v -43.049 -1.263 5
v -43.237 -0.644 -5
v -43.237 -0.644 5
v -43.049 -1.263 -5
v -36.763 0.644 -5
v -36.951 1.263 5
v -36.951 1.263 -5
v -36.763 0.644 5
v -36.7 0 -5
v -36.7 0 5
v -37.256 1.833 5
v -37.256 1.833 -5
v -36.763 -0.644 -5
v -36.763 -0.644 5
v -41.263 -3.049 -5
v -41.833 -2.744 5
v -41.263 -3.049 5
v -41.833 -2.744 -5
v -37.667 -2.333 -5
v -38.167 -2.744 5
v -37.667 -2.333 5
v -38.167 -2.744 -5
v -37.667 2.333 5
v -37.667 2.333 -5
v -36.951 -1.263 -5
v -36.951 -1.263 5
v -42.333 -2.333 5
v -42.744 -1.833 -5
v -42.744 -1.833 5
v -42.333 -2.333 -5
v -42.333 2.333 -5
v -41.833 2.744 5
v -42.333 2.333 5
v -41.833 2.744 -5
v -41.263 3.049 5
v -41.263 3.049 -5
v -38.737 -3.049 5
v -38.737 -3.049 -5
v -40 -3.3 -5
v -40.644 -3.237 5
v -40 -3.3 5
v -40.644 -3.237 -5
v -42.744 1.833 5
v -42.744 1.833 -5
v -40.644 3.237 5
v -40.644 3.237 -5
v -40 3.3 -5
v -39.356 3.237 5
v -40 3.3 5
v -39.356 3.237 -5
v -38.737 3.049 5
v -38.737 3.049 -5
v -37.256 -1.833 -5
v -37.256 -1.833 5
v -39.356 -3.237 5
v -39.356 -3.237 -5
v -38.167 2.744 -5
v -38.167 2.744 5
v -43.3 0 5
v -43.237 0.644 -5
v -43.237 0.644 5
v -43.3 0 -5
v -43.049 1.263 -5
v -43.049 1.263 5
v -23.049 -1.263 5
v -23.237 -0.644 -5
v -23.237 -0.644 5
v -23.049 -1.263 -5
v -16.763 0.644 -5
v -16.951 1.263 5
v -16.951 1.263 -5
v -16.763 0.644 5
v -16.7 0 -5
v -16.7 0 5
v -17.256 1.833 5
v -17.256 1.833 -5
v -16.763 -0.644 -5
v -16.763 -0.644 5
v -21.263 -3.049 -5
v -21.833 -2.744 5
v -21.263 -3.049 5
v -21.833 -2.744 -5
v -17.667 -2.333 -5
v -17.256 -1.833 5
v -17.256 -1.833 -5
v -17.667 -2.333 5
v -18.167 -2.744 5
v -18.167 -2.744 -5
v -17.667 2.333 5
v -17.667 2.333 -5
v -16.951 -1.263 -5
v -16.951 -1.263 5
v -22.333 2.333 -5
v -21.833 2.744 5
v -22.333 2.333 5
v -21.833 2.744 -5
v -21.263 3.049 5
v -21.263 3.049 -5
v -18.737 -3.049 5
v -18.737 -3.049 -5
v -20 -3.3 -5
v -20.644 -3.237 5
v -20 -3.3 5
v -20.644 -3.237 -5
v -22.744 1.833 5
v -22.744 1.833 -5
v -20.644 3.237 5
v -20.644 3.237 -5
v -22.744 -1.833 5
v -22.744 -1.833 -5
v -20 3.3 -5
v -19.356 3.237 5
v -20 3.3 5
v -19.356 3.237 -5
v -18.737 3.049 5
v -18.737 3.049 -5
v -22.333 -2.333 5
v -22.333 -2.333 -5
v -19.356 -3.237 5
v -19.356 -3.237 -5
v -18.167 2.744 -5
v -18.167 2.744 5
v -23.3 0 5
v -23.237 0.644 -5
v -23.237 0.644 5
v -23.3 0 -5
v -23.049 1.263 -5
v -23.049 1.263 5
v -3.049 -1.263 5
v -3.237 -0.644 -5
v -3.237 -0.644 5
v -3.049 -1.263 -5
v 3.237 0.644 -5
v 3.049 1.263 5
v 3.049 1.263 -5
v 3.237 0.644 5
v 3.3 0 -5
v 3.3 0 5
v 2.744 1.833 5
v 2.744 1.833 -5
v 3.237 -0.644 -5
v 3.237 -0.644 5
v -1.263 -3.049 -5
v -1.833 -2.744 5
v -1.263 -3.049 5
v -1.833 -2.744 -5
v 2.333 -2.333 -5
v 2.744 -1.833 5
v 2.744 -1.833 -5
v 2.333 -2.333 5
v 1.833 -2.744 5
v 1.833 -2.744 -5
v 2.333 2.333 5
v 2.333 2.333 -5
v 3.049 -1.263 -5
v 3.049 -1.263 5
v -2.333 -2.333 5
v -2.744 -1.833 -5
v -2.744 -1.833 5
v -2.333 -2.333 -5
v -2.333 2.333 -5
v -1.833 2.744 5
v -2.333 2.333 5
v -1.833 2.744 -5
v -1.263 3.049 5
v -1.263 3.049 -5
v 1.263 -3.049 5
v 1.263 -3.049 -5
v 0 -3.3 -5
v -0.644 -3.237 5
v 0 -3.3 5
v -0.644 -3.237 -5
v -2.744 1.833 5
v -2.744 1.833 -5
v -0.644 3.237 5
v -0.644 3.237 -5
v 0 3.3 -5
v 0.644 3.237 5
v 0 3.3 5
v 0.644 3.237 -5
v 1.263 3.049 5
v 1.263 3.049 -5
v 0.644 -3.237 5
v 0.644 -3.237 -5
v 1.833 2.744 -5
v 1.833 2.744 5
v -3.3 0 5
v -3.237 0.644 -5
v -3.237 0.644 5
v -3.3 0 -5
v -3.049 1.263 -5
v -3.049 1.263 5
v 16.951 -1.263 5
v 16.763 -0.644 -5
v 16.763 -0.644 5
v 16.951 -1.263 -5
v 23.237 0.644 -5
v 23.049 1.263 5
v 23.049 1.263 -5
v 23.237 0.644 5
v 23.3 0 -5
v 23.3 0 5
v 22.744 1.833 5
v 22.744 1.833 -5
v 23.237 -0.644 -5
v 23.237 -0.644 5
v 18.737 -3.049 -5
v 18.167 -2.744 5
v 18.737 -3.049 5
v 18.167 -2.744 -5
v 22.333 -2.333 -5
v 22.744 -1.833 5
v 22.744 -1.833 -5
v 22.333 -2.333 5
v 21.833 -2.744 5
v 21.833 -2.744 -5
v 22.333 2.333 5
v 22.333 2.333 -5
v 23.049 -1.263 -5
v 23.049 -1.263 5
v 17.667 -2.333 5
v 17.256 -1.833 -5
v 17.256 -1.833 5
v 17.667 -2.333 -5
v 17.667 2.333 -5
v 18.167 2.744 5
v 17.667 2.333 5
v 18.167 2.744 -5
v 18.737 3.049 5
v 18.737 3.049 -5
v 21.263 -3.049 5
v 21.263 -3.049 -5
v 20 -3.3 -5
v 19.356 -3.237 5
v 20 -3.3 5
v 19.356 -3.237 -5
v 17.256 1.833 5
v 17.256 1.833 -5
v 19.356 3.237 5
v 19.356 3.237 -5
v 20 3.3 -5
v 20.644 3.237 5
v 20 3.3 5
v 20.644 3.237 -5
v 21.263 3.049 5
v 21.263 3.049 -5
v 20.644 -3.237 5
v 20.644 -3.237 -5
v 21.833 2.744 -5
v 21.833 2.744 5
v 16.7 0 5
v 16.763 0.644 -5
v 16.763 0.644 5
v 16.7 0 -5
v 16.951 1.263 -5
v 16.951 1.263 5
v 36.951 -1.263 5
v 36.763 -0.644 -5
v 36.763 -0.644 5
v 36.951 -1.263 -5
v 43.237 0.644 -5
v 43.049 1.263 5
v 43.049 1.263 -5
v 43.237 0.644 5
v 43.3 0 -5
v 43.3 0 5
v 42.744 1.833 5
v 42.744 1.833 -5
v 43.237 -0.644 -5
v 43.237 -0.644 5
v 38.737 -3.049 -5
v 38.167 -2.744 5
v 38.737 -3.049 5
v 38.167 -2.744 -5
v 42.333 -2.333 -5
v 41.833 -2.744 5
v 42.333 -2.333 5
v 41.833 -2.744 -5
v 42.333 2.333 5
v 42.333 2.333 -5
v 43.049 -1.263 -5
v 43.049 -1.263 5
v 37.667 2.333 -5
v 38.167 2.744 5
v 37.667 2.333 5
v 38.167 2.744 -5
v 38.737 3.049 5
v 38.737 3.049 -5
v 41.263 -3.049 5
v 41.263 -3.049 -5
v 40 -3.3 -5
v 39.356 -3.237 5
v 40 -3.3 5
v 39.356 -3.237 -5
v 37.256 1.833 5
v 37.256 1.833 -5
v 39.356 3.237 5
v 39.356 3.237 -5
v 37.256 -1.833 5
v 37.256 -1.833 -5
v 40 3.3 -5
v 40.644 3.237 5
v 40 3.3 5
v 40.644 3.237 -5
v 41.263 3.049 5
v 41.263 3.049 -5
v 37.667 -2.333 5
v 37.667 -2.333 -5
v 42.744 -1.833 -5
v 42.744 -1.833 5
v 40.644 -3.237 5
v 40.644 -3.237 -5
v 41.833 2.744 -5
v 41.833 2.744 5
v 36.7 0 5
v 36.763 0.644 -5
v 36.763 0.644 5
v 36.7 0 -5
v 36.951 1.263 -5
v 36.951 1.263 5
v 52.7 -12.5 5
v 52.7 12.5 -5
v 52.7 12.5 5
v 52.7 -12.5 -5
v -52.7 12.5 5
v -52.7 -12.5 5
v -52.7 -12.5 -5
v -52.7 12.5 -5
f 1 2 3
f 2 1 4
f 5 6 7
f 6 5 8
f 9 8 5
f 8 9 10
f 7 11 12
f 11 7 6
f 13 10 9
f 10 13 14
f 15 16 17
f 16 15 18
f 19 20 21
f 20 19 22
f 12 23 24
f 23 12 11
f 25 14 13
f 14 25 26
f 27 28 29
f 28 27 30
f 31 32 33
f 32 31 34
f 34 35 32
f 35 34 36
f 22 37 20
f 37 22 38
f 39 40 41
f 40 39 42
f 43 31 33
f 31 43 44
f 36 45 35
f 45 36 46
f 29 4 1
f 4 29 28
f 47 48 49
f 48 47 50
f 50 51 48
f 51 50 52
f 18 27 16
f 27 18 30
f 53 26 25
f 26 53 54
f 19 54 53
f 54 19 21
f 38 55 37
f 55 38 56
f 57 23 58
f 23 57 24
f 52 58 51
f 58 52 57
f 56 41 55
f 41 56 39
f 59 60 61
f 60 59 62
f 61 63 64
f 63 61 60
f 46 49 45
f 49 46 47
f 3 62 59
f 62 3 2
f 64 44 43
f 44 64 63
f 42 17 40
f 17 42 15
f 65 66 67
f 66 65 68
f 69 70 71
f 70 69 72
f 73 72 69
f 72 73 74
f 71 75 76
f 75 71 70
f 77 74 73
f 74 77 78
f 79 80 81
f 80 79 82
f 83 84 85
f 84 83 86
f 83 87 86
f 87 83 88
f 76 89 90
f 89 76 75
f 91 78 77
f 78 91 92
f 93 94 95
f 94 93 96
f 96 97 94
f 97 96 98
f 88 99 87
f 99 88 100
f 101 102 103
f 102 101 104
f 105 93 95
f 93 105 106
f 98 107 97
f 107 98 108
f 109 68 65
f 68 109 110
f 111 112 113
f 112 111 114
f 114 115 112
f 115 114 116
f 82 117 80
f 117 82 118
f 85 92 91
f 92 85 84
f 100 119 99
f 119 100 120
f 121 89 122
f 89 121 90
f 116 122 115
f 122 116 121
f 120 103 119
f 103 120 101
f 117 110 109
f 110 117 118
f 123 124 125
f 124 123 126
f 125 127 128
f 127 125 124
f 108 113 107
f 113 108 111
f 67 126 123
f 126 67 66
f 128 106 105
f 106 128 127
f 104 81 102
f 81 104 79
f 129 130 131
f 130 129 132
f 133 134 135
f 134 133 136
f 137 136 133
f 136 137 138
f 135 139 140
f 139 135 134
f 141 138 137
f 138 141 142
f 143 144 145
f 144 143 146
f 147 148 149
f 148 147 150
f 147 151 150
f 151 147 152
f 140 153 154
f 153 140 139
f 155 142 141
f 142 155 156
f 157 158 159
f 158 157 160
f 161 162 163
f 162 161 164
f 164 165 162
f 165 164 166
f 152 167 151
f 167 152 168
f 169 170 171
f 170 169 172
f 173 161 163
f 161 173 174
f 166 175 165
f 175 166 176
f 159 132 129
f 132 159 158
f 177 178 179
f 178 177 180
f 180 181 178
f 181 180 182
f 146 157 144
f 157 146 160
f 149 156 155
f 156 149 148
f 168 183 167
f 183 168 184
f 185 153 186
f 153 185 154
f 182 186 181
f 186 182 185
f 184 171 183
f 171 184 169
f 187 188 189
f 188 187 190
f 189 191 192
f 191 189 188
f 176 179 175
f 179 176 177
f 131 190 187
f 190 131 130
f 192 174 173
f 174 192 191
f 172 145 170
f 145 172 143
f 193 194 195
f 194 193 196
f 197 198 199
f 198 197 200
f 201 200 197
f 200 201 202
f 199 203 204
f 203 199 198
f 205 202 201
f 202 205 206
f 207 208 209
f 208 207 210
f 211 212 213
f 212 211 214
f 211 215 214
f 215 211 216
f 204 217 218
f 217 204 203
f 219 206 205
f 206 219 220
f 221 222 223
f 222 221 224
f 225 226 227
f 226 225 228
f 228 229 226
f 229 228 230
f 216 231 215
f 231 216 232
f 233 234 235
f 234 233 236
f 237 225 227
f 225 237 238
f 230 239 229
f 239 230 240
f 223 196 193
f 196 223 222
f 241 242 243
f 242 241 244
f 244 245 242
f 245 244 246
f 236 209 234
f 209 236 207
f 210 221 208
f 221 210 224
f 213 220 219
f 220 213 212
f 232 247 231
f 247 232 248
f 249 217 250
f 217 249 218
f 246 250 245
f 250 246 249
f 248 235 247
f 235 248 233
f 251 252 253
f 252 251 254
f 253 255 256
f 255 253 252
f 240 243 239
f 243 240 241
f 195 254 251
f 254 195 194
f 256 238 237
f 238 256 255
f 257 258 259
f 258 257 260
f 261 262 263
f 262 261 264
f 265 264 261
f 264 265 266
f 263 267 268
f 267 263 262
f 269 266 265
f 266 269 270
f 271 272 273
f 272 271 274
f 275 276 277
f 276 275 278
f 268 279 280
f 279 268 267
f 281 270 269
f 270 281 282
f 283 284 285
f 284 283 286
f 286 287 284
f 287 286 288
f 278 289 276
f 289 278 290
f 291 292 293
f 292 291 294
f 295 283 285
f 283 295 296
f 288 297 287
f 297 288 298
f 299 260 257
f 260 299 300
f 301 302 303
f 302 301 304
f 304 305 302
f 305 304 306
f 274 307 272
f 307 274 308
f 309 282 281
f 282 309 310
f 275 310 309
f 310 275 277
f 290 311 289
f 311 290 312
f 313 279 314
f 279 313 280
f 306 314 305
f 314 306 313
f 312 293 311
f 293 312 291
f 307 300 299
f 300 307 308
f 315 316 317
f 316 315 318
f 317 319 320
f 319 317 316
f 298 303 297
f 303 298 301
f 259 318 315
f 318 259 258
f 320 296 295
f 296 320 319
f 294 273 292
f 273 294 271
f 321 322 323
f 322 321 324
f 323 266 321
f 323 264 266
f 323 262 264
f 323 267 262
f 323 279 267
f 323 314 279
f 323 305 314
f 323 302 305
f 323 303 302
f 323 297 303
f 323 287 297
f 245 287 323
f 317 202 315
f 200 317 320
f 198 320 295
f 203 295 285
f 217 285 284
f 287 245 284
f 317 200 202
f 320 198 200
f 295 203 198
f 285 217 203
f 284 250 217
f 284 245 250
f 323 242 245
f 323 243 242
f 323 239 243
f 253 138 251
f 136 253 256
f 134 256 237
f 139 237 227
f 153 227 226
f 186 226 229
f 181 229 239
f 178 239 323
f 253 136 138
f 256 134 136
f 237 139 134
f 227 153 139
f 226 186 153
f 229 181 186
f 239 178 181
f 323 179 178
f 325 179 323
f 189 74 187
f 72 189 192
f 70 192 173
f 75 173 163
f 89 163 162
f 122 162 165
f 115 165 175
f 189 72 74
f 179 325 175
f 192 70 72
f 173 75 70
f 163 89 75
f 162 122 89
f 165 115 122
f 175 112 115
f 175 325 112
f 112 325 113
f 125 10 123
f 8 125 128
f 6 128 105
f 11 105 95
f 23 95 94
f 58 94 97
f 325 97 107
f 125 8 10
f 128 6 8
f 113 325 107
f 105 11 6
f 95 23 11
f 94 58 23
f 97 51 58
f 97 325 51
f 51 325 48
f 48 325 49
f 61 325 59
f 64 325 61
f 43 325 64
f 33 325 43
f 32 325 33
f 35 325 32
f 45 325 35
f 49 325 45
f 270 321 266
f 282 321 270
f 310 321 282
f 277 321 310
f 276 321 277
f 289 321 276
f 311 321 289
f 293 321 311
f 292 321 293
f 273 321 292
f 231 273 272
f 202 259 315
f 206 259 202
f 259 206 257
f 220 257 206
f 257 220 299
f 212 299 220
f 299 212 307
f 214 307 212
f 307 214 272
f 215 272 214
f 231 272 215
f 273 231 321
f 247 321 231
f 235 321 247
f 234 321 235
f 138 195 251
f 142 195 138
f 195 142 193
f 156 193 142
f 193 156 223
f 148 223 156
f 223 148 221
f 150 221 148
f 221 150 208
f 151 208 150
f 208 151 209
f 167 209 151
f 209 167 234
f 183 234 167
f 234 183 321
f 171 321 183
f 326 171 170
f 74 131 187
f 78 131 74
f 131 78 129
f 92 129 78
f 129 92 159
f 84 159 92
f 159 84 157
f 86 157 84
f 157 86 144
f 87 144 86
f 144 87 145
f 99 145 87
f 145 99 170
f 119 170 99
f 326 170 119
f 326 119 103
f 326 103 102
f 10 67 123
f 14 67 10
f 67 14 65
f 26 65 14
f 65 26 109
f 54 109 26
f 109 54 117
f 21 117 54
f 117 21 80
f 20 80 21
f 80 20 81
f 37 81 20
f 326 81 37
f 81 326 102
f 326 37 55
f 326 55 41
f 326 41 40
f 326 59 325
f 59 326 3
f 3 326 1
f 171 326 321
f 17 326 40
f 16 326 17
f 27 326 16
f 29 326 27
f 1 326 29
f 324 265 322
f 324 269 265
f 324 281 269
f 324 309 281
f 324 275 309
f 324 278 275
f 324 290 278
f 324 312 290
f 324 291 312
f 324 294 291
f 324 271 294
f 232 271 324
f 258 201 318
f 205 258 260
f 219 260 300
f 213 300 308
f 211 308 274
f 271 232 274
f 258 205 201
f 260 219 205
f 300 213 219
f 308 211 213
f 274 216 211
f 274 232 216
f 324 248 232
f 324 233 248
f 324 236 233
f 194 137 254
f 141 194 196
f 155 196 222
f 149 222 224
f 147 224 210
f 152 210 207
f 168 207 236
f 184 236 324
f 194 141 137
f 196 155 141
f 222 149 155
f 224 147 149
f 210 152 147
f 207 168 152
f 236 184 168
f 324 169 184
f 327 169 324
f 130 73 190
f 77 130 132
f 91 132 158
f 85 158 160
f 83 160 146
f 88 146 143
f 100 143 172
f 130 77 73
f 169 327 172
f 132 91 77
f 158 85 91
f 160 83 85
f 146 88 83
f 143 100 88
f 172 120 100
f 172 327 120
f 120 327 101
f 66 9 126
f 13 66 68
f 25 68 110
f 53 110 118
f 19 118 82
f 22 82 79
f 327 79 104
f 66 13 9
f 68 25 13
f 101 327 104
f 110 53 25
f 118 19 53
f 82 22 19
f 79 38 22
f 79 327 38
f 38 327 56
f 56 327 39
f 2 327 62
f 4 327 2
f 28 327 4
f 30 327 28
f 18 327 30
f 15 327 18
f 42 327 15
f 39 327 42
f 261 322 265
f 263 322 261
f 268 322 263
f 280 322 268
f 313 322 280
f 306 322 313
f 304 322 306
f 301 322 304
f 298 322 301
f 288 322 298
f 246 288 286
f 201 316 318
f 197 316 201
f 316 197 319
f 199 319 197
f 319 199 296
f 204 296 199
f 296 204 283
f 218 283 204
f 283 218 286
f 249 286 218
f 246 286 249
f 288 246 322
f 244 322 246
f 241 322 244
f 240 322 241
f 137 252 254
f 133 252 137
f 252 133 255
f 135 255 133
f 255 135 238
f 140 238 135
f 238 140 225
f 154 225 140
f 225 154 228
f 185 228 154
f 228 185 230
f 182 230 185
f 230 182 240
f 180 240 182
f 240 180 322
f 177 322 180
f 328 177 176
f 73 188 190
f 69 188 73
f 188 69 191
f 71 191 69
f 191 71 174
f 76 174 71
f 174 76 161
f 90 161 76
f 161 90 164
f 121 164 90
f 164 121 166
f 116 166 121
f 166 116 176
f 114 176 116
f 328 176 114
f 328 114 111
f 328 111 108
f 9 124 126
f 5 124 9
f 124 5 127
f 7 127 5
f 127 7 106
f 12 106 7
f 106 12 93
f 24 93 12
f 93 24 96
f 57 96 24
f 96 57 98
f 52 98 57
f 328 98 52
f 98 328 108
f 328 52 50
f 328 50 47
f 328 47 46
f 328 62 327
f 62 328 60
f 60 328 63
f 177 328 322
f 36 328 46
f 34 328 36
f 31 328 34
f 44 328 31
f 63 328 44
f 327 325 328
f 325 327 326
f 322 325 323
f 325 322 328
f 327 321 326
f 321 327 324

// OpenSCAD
$fn = 32;

// ----------------------------------------------------------------------
// Hole bar, 5 x Ø6.6
// row layout, 12.7 mm edge offset
// ----------------------------------------------------------------------

// --- parameters (mm) ---
bar_w = 25;    // bar width (Y)
bar_t = 10;    // bar thickness (Z)
holes = 5;     // holes per row
hole_d = 6.6;  // hole diameter
edge = 12.7;   // offset from the bar end to the first hole
pitch = 20;    // pitch between neighbouring holes

// --- derived feature positions (mm) ---
span = (holes - 1) * pitch;   // = 80   distance between the end holes
bar_l = span + 2 * edge;      // = 105.4   overall bar length
start_x = -bar_l / 2 + edge;  // = -40   X of the first hole
feature_centers = [
  [start_x + 0 * pitch, 0],
  [start_x + 1 * pitch, 0],
  [start_x + 2 * pitch, 0],
  [start_x + 3 * pitch, 0],
  [start_x + 4 * pitch, 0]
];   // hole centres of the first row

// bar with one row of holes, drilled from feature_centers
difference() {
  translate([-bar_l / 2, -bar_w / 2, -bar_t / 2]) cube([bar_l, bar_w, bar_t]);
  for (centre = feature_centers)
    translate([centre[0], centre[1], 0])
      cylinder(d = hole_d, h = bar_t + 2, center = true);
}
